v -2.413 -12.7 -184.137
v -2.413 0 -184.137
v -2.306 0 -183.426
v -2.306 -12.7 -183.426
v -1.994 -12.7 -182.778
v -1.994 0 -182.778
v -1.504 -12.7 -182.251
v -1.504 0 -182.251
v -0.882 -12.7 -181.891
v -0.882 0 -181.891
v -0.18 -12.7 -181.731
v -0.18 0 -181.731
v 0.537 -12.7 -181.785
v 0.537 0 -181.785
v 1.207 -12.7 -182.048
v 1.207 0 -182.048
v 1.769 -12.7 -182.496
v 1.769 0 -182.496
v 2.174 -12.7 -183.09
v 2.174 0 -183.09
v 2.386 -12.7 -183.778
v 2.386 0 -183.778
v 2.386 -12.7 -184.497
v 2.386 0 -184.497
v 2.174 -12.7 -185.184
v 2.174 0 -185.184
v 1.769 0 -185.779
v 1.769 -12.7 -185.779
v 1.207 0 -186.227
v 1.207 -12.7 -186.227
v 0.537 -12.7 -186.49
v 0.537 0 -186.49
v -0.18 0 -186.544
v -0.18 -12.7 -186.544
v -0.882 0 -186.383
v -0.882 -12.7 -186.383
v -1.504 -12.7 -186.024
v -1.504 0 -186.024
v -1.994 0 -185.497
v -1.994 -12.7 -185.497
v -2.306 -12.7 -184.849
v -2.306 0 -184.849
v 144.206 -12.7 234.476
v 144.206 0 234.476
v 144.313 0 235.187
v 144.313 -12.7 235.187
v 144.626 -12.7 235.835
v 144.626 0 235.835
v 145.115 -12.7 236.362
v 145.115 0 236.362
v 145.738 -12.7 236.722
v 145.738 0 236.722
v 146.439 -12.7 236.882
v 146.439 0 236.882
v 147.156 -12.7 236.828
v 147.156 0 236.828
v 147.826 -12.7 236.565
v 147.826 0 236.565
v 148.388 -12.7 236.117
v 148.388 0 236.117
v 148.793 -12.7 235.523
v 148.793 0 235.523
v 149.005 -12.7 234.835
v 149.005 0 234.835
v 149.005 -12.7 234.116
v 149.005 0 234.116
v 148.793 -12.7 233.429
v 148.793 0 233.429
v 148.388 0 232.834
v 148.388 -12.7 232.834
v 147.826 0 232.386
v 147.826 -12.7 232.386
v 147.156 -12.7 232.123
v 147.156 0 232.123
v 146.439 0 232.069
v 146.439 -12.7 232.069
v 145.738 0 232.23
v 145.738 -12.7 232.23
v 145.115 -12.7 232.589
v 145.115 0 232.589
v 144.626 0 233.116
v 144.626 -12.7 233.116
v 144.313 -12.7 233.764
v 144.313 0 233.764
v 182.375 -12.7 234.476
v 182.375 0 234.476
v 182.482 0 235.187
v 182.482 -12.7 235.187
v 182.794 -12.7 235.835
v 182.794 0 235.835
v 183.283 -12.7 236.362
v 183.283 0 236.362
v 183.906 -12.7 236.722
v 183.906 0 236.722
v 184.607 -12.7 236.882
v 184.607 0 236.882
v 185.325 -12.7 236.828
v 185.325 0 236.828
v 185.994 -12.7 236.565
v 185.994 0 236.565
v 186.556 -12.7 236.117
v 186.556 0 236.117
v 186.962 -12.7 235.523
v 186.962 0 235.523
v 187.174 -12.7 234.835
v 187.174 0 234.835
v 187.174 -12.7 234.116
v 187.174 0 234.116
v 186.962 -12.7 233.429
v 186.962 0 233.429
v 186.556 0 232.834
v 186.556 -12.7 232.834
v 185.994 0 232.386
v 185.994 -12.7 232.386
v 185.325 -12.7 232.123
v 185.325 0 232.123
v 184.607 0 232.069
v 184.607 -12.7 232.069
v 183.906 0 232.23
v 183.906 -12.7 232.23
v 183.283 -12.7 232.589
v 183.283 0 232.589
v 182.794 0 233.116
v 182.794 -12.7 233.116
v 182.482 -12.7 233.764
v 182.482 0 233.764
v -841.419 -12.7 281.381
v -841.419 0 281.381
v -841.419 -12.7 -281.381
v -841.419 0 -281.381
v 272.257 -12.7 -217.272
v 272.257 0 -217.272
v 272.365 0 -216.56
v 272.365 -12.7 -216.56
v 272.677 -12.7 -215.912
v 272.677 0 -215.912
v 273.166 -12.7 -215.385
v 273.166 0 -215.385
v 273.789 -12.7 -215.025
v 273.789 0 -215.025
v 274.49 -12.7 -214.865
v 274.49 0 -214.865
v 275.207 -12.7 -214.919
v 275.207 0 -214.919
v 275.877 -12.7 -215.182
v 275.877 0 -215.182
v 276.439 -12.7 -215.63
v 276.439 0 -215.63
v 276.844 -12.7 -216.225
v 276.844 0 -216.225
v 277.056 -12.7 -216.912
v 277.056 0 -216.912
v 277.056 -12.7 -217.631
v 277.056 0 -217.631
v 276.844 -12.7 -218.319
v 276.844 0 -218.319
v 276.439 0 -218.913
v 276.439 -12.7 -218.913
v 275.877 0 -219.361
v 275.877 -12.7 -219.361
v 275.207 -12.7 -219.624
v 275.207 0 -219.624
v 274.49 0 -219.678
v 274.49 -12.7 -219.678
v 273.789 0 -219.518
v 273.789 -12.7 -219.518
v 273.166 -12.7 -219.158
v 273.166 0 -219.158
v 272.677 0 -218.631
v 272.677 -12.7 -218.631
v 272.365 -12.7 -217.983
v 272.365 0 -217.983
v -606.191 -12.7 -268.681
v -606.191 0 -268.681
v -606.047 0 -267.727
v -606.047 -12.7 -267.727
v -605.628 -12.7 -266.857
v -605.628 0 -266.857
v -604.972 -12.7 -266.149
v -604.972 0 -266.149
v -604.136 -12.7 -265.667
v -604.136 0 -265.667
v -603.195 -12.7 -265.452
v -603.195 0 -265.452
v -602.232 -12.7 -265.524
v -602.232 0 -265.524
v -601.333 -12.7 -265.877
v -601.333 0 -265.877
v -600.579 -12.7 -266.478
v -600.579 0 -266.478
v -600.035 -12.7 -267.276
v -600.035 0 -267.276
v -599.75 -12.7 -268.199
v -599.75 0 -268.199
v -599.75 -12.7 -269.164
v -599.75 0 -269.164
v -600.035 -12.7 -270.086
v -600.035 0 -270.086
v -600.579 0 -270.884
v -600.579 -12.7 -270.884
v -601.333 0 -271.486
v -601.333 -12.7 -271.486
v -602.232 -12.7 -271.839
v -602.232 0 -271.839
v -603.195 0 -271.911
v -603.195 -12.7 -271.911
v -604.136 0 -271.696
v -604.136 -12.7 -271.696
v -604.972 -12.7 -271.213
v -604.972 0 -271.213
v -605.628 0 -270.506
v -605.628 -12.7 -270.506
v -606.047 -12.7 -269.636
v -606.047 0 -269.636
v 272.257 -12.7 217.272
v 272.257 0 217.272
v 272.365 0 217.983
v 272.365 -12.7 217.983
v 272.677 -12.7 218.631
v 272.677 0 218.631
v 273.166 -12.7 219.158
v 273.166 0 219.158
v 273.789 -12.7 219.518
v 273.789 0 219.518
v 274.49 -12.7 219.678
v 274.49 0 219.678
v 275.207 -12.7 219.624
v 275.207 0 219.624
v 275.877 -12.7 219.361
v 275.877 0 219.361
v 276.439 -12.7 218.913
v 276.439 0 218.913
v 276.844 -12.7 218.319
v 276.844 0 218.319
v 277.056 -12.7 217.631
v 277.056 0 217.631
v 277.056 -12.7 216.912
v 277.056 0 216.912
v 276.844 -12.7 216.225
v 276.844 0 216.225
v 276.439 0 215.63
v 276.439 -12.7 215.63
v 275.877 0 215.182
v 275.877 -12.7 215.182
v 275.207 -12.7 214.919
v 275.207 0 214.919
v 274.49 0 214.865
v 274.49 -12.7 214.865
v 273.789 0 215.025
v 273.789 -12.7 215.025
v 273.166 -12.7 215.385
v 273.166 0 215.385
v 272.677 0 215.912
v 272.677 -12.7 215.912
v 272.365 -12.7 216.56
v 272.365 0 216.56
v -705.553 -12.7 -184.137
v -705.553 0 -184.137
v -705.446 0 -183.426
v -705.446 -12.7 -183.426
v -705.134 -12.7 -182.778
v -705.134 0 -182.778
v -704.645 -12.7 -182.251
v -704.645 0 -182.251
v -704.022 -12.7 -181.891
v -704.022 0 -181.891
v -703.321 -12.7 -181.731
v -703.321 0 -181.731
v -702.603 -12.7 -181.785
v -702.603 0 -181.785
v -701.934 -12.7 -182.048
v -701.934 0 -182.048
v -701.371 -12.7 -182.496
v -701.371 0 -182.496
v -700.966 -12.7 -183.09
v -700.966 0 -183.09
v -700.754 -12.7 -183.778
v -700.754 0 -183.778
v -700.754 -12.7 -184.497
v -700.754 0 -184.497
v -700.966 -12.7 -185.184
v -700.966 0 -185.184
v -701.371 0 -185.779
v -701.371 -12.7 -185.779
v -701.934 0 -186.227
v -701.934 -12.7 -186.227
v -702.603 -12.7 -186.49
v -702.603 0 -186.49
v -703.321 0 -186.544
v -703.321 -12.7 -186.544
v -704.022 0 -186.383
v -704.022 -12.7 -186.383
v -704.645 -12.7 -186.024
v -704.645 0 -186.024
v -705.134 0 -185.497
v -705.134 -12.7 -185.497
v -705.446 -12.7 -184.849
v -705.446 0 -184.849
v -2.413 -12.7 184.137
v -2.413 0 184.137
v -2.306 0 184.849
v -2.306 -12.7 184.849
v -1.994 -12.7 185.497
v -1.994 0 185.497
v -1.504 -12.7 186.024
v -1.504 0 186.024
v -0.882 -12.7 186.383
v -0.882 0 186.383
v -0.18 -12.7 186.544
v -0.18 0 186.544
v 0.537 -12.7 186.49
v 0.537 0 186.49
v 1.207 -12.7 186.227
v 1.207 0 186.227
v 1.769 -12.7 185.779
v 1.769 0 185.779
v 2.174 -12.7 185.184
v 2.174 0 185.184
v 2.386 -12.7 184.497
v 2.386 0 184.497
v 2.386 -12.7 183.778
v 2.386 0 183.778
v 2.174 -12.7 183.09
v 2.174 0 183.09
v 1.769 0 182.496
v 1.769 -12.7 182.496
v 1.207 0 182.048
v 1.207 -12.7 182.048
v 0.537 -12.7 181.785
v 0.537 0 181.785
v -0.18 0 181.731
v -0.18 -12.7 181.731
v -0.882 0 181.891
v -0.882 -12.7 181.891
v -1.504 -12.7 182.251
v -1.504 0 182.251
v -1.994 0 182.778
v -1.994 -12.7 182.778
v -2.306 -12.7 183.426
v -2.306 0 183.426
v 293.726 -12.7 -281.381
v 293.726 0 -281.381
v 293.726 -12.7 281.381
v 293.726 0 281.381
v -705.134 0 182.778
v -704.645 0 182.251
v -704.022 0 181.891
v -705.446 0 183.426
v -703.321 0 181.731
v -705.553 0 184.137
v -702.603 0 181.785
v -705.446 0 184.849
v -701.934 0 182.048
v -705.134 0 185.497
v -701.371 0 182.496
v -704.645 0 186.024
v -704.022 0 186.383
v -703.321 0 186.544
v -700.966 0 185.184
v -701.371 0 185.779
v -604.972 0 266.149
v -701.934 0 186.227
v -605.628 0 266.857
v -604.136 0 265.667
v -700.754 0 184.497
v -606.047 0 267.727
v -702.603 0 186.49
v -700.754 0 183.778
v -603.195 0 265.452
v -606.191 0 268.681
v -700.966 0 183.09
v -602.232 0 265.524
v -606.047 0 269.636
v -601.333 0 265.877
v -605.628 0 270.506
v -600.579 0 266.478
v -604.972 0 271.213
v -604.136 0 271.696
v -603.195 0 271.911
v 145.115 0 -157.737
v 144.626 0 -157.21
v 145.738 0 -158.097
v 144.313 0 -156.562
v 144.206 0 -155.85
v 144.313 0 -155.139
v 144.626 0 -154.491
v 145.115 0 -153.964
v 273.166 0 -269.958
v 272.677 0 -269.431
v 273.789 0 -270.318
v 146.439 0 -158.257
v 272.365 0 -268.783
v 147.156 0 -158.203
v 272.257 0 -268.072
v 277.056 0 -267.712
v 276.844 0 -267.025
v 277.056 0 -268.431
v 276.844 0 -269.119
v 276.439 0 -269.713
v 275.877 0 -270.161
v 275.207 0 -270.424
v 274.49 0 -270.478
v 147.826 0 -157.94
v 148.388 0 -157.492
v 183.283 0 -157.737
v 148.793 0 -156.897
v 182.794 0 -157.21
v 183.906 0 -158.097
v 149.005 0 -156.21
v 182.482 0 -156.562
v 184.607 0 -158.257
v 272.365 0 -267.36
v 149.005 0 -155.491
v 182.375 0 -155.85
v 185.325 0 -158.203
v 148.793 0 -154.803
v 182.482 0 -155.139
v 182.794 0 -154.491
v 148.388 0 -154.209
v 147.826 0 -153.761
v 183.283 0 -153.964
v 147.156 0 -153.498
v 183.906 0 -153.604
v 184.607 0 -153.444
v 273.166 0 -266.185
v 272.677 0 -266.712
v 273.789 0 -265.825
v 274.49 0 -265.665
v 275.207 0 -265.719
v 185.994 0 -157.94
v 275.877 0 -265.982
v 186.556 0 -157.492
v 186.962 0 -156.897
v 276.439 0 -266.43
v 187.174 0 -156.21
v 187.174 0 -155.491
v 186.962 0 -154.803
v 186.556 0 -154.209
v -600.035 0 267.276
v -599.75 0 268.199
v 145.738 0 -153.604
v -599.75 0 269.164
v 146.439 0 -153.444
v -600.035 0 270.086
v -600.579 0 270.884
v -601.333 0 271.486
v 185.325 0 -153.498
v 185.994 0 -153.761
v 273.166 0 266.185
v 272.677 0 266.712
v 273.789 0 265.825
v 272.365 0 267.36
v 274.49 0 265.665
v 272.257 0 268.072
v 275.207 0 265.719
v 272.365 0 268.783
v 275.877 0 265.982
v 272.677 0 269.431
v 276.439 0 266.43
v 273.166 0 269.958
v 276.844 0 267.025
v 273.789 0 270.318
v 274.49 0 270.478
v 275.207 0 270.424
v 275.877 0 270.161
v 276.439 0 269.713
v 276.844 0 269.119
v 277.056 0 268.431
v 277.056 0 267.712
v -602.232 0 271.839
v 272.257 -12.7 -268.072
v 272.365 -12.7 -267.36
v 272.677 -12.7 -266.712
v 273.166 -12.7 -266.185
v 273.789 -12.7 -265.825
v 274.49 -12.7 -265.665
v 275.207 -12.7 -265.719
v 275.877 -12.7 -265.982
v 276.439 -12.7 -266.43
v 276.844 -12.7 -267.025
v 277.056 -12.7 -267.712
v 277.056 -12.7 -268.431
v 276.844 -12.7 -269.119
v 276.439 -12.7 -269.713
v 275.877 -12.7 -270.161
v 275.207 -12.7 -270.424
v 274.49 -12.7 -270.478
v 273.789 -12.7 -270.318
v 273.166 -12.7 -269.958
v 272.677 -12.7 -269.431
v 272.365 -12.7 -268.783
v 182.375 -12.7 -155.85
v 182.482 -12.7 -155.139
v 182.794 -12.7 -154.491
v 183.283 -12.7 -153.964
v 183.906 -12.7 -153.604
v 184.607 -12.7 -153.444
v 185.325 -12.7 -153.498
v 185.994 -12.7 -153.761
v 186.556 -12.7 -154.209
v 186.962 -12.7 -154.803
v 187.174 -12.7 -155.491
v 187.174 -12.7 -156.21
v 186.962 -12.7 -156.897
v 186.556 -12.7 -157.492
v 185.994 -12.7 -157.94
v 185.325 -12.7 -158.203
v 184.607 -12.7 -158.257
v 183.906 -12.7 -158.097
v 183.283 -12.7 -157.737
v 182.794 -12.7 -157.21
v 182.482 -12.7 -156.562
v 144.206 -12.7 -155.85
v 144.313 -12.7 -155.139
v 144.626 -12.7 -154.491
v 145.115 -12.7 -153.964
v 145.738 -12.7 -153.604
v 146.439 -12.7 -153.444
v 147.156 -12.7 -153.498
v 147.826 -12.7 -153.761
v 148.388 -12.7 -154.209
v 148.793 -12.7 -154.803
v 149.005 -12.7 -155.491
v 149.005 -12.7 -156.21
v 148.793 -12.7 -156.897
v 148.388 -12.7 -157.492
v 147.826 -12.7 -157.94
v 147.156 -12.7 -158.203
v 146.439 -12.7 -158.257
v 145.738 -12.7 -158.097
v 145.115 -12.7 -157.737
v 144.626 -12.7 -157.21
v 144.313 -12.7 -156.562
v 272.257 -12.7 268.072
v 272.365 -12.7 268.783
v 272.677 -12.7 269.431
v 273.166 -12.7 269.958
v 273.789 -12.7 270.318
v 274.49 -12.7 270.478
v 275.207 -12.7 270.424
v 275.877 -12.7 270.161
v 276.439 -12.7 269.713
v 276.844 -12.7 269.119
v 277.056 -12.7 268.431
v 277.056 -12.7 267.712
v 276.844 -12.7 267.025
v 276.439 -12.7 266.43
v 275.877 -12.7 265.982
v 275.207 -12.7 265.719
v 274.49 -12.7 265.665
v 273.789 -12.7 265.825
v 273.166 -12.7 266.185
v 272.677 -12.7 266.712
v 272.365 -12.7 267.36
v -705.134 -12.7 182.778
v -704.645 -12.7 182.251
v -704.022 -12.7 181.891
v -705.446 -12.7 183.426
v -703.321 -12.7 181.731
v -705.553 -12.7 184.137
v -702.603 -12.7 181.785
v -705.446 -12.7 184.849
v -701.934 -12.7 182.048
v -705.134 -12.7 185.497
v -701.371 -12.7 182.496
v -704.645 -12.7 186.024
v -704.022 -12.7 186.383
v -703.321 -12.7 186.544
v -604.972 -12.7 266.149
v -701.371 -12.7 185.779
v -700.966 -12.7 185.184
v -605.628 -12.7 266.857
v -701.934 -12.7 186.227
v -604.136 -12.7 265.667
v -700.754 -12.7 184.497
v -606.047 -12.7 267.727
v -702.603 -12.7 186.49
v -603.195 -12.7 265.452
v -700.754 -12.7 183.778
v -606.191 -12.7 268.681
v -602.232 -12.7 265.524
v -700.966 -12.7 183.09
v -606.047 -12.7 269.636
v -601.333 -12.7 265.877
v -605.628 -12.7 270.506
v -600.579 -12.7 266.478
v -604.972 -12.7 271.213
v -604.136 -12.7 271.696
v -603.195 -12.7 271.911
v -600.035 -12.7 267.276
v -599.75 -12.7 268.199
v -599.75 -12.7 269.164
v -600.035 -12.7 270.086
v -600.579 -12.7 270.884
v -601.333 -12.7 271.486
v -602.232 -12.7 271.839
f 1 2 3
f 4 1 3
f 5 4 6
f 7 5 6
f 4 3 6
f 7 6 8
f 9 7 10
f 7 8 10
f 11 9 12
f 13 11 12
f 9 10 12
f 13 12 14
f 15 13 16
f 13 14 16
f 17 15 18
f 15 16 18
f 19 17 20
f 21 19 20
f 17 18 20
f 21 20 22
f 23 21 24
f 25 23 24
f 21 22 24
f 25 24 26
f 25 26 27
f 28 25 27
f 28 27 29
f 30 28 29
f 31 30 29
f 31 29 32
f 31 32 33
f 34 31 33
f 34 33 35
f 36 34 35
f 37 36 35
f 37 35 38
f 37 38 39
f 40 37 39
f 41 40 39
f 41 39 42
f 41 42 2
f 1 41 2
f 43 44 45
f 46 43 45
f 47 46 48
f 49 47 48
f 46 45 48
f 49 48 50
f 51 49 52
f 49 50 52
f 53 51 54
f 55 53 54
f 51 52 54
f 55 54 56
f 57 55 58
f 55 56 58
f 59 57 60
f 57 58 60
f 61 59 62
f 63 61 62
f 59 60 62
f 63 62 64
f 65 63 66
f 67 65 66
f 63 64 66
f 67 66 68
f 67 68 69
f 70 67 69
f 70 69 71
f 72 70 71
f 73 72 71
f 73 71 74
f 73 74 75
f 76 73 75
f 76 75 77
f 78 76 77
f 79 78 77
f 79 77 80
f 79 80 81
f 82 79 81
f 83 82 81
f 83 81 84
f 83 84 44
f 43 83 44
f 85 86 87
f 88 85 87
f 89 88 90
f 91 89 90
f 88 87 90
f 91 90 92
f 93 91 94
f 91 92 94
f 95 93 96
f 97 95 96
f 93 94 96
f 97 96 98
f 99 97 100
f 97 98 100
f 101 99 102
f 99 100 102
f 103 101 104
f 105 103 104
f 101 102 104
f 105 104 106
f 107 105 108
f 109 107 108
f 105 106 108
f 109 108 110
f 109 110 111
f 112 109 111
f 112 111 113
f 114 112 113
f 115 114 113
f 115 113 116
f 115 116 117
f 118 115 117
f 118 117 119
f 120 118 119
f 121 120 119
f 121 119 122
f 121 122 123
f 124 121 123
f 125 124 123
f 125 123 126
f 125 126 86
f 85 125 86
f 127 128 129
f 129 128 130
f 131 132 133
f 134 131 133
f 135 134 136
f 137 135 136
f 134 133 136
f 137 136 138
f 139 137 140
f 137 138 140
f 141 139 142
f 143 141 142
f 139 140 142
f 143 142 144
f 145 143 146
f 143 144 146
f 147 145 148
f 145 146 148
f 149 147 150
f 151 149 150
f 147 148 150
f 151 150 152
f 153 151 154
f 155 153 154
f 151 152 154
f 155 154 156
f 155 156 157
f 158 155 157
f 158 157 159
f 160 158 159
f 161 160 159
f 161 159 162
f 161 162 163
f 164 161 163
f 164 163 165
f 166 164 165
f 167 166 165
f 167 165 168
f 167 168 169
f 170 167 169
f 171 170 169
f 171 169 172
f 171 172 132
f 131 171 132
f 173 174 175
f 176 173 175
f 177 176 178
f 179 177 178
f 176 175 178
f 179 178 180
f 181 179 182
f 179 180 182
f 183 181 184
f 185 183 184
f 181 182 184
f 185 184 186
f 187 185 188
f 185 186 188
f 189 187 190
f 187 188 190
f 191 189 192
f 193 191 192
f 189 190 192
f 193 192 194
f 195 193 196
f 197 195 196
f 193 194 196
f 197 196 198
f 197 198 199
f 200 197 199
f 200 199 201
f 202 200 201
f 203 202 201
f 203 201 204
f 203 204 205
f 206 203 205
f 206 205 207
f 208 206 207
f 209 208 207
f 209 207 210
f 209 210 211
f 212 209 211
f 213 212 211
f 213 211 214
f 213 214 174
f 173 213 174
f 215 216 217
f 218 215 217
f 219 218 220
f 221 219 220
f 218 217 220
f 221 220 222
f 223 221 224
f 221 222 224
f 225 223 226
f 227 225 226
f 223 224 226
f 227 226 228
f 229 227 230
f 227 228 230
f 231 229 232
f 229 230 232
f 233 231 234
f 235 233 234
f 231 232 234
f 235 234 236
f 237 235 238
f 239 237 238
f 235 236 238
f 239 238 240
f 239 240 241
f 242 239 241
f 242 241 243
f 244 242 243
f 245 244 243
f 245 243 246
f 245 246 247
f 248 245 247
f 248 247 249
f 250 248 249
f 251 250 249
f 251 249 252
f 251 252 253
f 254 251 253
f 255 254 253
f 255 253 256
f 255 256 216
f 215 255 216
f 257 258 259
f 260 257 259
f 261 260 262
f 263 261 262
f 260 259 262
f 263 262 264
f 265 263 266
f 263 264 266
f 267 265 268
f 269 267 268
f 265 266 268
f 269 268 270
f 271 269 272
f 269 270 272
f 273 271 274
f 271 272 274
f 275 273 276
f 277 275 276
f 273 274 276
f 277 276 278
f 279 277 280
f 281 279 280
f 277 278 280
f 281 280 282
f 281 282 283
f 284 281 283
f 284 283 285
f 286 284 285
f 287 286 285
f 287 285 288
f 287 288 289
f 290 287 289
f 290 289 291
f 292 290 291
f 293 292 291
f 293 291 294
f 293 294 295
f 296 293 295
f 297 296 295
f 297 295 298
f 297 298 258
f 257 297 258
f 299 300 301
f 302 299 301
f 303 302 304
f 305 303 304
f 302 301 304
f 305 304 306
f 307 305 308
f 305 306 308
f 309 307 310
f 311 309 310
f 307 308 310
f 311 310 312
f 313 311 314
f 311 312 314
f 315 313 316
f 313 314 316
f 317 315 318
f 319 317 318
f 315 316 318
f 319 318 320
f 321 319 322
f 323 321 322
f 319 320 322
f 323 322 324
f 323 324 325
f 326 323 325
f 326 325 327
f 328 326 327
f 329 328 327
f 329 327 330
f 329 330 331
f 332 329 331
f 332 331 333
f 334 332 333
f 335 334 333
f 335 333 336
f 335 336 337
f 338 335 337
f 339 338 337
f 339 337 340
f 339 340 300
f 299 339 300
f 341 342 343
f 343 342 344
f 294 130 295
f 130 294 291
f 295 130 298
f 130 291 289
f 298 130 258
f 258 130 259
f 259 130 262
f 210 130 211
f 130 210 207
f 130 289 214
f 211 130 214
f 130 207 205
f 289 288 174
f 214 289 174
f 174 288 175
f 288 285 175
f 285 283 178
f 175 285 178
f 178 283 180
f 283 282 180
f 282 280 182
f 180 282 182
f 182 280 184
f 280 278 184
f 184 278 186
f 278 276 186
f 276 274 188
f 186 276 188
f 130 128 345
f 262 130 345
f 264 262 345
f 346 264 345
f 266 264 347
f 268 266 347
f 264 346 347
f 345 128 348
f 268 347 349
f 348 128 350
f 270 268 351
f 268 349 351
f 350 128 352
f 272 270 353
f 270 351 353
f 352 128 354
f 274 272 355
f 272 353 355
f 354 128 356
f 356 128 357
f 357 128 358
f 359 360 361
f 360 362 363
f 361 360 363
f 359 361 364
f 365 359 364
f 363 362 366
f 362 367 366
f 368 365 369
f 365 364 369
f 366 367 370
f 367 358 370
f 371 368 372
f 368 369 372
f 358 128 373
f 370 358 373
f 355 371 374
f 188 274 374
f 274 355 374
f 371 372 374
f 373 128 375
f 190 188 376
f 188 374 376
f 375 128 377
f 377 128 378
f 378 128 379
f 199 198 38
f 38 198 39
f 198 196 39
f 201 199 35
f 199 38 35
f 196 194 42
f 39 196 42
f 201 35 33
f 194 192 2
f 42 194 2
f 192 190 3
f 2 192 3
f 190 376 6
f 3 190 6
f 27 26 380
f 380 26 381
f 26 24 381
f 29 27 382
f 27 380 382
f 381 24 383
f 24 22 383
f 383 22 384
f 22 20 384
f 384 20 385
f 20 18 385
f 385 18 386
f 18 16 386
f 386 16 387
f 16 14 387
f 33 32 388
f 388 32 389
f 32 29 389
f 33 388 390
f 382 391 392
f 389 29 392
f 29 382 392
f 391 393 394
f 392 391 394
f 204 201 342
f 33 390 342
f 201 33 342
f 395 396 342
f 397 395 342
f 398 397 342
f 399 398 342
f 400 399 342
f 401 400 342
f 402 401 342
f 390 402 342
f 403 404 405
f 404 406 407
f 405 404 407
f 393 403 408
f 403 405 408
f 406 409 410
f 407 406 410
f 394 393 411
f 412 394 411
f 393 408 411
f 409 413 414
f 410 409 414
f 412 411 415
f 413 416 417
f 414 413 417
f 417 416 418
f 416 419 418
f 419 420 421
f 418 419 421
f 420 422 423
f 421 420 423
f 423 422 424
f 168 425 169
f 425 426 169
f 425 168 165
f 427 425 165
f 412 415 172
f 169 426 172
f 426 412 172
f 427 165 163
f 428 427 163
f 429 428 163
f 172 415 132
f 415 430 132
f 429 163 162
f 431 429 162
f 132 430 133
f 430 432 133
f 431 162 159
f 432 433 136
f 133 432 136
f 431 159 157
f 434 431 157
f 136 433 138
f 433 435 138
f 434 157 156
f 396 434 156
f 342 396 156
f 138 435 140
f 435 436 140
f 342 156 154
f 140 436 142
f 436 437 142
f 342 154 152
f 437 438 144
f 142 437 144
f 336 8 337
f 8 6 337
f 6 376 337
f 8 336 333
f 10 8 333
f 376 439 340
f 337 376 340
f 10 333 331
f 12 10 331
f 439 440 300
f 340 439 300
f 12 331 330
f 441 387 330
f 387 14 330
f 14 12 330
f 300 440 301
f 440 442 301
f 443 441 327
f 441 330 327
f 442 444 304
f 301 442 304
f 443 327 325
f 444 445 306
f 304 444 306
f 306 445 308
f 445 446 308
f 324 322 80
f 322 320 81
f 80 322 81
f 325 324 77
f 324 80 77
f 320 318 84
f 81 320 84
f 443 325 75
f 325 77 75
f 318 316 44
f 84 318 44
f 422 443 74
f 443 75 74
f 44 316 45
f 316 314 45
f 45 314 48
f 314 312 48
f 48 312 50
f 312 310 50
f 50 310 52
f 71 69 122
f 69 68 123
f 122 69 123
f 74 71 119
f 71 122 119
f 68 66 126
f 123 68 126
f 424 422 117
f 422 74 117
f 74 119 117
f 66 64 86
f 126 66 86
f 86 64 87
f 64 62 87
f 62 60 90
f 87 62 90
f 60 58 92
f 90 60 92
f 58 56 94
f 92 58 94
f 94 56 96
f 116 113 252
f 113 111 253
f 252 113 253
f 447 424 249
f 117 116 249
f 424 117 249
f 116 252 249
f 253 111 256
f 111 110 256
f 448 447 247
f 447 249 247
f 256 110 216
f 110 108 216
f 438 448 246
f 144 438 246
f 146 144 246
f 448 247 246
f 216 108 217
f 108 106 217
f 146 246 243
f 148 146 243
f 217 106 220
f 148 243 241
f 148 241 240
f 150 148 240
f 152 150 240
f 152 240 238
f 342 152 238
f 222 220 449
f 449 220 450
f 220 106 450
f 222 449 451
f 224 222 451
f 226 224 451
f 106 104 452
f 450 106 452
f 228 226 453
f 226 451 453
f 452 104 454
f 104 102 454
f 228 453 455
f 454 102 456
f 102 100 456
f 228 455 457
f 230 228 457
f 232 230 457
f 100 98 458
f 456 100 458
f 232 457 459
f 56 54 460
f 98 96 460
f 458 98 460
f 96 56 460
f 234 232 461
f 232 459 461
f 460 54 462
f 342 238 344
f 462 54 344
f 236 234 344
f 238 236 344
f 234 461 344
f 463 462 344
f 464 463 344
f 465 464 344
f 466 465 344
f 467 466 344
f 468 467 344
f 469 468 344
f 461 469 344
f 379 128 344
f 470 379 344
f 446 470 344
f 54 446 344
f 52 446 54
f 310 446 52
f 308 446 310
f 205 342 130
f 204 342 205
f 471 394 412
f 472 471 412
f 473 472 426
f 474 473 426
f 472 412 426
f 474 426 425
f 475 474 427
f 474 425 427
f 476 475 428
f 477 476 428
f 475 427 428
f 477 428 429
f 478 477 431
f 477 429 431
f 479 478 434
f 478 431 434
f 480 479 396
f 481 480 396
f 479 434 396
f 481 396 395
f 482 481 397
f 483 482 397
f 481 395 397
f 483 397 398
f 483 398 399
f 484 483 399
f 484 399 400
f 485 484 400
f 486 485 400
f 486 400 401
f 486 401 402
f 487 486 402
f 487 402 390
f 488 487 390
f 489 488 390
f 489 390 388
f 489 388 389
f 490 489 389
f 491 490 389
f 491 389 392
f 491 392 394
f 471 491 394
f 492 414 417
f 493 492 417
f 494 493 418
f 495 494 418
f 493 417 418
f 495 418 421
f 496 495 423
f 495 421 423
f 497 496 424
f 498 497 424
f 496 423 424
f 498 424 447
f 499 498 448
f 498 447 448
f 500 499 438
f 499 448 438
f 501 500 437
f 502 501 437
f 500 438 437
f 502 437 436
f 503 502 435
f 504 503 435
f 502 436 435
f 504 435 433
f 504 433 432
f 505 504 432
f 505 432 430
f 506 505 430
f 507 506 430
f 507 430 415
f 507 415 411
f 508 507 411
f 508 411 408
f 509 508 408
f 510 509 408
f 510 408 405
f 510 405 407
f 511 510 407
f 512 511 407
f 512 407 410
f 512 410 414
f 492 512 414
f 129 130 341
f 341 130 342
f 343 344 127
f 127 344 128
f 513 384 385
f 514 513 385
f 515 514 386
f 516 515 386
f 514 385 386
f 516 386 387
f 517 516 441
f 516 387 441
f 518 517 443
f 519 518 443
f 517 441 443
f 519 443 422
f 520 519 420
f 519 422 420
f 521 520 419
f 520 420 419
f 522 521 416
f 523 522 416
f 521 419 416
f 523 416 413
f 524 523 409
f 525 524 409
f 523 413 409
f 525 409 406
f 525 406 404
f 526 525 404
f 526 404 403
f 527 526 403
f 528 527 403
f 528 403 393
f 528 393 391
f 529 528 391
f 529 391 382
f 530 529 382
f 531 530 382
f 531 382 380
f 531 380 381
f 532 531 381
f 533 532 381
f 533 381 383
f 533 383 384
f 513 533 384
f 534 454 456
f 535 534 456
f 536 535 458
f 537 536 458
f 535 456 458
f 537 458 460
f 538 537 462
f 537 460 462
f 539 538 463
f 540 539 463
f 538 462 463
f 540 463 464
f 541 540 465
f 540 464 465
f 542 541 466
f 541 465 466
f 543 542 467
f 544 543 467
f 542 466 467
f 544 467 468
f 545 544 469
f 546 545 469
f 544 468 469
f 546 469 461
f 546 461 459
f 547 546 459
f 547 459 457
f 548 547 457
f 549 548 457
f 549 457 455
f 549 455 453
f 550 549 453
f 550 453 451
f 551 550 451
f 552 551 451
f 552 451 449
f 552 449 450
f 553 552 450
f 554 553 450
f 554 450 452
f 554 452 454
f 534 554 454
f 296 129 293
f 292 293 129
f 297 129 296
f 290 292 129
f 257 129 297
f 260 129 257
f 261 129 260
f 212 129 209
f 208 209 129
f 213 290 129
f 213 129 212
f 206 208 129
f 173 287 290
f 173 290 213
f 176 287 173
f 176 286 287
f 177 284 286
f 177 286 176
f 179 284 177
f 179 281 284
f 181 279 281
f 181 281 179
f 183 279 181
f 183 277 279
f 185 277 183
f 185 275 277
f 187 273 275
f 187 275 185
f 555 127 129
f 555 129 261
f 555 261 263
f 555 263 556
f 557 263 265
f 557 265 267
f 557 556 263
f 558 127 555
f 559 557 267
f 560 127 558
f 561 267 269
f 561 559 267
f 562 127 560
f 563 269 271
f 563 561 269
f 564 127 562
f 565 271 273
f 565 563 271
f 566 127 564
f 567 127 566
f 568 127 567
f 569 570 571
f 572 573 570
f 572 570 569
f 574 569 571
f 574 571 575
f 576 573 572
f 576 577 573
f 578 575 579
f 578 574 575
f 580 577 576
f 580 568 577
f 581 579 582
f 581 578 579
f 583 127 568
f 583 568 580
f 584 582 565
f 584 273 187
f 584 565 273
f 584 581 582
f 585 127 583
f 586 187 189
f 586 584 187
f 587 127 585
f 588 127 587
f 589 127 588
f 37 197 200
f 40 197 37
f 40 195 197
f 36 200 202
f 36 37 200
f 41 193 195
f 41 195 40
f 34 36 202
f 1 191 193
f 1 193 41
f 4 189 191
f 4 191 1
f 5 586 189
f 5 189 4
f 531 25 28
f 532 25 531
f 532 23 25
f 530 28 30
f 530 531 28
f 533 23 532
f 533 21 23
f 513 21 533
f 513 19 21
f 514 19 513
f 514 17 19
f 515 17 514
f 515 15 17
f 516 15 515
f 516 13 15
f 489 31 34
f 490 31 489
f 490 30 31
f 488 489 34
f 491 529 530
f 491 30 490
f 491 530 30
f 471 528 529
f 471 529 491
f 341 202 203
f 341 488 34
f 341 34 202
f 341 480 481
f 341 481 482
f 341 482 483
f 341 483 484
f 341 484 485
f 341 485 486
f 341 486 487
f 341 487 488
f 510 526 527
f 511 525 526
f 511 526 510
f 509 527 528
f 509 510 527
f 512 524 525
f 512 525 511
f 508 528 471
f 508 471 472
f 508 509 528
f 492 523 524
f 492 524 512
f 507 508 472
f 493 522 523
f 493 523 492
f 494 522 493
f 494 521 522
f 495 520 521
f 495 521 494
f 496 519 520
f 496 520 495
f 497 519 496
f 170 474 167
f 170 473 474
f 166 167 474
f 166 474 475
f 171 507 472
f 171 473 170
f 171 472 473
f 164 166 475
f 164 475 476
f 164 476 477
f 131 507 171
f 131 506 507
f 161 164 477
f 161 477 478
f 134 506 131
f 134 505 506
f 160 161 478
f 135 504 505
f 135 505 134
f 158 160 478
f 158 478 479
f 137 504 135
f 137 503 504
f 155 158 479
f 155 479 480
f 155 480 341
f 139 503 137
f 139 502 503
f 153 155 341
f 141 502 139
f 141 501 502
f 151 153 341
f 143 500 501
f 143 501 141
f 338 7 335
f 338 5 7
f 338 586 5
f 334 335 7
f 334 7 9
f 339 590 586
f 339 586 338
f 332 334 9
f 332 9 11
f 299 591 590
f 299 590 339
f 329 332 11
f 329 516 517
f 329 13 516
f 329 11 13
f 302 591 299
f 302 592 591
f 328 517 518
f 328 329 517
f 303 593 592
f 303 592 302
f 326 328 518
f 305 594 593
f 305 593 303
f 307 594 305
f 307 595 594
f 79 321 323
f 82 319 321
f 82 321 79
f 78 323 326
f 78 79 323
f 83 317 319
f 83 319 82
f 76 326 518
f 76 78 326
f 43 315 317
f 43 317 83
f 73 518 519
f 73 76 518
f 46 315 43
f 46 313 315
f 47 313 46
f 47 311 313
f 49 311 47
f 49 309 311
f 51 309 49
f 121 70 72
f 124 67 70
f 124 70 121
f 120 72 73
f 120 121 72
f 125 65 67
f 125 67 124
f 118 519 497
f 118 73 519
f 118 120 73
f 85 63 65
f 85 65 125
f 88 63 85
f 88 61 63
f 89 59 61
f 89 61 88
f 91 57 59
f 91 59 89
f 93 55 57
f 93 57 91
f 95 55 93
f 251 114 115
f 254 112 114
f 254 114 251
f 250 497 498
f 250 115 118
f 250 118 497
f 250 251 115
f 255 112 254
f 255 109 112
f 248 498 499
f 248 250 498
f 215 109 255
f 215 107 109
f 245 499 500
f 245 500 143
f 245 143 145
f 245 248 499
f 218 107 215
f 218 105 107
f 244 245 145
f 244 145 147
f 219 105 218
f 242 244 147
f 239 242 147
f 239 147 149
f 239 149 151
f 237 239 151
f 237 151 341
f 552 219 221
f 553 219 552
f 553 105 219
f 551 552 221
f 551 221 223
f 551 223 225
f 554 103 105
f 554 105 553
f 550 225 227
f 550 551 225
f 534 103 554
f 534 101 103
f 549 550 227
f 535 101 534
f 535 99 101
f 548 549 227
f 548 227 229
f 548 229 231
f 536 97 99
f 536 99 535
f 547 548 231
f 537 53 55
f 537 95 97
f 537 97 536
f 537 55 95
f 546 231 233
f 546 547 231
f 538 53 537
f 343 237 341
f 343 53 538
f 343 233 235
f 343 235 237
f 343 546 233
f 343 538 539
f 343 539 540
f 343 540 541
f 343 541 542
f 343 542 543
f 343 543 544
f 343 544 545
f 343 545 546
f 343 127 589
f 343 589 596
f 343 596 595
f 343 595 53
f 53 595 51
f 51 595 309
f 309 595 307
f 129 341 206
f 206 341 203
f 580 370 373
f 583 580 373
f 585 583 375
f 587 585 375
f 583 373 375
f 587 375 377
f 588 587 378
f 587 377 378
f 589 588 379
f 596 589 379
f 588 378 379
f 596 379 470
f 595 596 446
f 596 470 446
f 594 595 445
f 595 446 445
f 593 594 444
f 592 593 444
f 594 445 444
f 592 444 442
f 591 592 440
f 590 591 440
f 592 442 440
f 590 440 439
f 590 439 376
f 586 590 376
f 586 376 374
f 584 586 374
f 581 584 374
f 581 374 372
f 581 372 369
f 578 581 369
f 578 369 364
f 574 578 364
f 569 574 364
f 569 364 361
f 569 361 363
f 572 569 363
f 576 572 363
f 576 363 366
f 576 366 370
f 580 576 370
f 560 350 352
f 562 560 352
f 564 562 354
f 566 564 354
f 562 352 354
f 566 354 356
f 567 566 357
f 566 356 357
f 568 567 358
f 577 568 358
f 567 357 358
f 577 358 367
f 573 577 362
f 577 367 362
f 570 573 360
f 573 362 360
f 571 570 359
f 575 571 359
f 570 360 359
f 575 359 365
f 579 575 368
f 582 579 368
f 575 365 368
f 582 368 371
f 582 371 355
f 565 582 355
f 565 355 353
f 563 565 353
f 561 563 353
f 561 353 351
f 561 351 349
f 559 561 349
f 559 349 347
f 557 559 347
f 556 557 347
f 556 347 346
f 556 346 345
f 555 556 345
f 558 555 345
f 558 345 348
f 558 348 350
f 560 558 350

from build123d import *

# Parameters (mm, degrees)
F1_DEPTH = 12.7
F3_D     = 4.826
F5_D     = 6.477
F7_D     = 4.826


with BuildPart() as f1:
    # F0 (on Front) → F1 (new body)
    with BuildSketch(Plane.XZ):
        Polygon((293.7256, -281.3812), (293.7256, 281.3812), (-381, 281.3812), (-736.6, 281.3812), (-780.238727, 281.3812), (-802.05809, 281.3812), (-803.32809, 281.3812), (-841.418803, 281.3812), (-841.418803, -281.3812), (-803.32809, -281.3812), (-802.05809, -281.3812), (-780.238727, -281.3812), (-736.6, -281.3812), (-381, -281.3812), align=None)
    extrude(amount=F1_DEPTH)

    # F3 (through all)
    with Locations(Plane.XZ.offset(12.7)):
        with Locations((184.787571, 234.475727), (146.619245, 234.475727), (184.787571, -155.850366), (146.619245, -155.850366), (274.670382, -268.0716), (274.670382, 268.0716), (274.670382, 217.2716), (274.670382, -217.2716)):
            Hole(F3_D / 2)

    # F5 (through all)
    with Locations(Plane.XZ.offset(12.7)):
        with Locations((-602.95257, -268.6812), (-602.95257, 268.6812)):
            Hole(F5_D / 2)

    # F7 (through all)
    with Locations(Plane.XZ.offset(12.7)):
        with Locations((-703.14033, 184.1373), (-703.14033, -184.1373), (0, 184.1373), (0, -184.1373)):
            Hole(F7_D / 2)


solid = f1.part
